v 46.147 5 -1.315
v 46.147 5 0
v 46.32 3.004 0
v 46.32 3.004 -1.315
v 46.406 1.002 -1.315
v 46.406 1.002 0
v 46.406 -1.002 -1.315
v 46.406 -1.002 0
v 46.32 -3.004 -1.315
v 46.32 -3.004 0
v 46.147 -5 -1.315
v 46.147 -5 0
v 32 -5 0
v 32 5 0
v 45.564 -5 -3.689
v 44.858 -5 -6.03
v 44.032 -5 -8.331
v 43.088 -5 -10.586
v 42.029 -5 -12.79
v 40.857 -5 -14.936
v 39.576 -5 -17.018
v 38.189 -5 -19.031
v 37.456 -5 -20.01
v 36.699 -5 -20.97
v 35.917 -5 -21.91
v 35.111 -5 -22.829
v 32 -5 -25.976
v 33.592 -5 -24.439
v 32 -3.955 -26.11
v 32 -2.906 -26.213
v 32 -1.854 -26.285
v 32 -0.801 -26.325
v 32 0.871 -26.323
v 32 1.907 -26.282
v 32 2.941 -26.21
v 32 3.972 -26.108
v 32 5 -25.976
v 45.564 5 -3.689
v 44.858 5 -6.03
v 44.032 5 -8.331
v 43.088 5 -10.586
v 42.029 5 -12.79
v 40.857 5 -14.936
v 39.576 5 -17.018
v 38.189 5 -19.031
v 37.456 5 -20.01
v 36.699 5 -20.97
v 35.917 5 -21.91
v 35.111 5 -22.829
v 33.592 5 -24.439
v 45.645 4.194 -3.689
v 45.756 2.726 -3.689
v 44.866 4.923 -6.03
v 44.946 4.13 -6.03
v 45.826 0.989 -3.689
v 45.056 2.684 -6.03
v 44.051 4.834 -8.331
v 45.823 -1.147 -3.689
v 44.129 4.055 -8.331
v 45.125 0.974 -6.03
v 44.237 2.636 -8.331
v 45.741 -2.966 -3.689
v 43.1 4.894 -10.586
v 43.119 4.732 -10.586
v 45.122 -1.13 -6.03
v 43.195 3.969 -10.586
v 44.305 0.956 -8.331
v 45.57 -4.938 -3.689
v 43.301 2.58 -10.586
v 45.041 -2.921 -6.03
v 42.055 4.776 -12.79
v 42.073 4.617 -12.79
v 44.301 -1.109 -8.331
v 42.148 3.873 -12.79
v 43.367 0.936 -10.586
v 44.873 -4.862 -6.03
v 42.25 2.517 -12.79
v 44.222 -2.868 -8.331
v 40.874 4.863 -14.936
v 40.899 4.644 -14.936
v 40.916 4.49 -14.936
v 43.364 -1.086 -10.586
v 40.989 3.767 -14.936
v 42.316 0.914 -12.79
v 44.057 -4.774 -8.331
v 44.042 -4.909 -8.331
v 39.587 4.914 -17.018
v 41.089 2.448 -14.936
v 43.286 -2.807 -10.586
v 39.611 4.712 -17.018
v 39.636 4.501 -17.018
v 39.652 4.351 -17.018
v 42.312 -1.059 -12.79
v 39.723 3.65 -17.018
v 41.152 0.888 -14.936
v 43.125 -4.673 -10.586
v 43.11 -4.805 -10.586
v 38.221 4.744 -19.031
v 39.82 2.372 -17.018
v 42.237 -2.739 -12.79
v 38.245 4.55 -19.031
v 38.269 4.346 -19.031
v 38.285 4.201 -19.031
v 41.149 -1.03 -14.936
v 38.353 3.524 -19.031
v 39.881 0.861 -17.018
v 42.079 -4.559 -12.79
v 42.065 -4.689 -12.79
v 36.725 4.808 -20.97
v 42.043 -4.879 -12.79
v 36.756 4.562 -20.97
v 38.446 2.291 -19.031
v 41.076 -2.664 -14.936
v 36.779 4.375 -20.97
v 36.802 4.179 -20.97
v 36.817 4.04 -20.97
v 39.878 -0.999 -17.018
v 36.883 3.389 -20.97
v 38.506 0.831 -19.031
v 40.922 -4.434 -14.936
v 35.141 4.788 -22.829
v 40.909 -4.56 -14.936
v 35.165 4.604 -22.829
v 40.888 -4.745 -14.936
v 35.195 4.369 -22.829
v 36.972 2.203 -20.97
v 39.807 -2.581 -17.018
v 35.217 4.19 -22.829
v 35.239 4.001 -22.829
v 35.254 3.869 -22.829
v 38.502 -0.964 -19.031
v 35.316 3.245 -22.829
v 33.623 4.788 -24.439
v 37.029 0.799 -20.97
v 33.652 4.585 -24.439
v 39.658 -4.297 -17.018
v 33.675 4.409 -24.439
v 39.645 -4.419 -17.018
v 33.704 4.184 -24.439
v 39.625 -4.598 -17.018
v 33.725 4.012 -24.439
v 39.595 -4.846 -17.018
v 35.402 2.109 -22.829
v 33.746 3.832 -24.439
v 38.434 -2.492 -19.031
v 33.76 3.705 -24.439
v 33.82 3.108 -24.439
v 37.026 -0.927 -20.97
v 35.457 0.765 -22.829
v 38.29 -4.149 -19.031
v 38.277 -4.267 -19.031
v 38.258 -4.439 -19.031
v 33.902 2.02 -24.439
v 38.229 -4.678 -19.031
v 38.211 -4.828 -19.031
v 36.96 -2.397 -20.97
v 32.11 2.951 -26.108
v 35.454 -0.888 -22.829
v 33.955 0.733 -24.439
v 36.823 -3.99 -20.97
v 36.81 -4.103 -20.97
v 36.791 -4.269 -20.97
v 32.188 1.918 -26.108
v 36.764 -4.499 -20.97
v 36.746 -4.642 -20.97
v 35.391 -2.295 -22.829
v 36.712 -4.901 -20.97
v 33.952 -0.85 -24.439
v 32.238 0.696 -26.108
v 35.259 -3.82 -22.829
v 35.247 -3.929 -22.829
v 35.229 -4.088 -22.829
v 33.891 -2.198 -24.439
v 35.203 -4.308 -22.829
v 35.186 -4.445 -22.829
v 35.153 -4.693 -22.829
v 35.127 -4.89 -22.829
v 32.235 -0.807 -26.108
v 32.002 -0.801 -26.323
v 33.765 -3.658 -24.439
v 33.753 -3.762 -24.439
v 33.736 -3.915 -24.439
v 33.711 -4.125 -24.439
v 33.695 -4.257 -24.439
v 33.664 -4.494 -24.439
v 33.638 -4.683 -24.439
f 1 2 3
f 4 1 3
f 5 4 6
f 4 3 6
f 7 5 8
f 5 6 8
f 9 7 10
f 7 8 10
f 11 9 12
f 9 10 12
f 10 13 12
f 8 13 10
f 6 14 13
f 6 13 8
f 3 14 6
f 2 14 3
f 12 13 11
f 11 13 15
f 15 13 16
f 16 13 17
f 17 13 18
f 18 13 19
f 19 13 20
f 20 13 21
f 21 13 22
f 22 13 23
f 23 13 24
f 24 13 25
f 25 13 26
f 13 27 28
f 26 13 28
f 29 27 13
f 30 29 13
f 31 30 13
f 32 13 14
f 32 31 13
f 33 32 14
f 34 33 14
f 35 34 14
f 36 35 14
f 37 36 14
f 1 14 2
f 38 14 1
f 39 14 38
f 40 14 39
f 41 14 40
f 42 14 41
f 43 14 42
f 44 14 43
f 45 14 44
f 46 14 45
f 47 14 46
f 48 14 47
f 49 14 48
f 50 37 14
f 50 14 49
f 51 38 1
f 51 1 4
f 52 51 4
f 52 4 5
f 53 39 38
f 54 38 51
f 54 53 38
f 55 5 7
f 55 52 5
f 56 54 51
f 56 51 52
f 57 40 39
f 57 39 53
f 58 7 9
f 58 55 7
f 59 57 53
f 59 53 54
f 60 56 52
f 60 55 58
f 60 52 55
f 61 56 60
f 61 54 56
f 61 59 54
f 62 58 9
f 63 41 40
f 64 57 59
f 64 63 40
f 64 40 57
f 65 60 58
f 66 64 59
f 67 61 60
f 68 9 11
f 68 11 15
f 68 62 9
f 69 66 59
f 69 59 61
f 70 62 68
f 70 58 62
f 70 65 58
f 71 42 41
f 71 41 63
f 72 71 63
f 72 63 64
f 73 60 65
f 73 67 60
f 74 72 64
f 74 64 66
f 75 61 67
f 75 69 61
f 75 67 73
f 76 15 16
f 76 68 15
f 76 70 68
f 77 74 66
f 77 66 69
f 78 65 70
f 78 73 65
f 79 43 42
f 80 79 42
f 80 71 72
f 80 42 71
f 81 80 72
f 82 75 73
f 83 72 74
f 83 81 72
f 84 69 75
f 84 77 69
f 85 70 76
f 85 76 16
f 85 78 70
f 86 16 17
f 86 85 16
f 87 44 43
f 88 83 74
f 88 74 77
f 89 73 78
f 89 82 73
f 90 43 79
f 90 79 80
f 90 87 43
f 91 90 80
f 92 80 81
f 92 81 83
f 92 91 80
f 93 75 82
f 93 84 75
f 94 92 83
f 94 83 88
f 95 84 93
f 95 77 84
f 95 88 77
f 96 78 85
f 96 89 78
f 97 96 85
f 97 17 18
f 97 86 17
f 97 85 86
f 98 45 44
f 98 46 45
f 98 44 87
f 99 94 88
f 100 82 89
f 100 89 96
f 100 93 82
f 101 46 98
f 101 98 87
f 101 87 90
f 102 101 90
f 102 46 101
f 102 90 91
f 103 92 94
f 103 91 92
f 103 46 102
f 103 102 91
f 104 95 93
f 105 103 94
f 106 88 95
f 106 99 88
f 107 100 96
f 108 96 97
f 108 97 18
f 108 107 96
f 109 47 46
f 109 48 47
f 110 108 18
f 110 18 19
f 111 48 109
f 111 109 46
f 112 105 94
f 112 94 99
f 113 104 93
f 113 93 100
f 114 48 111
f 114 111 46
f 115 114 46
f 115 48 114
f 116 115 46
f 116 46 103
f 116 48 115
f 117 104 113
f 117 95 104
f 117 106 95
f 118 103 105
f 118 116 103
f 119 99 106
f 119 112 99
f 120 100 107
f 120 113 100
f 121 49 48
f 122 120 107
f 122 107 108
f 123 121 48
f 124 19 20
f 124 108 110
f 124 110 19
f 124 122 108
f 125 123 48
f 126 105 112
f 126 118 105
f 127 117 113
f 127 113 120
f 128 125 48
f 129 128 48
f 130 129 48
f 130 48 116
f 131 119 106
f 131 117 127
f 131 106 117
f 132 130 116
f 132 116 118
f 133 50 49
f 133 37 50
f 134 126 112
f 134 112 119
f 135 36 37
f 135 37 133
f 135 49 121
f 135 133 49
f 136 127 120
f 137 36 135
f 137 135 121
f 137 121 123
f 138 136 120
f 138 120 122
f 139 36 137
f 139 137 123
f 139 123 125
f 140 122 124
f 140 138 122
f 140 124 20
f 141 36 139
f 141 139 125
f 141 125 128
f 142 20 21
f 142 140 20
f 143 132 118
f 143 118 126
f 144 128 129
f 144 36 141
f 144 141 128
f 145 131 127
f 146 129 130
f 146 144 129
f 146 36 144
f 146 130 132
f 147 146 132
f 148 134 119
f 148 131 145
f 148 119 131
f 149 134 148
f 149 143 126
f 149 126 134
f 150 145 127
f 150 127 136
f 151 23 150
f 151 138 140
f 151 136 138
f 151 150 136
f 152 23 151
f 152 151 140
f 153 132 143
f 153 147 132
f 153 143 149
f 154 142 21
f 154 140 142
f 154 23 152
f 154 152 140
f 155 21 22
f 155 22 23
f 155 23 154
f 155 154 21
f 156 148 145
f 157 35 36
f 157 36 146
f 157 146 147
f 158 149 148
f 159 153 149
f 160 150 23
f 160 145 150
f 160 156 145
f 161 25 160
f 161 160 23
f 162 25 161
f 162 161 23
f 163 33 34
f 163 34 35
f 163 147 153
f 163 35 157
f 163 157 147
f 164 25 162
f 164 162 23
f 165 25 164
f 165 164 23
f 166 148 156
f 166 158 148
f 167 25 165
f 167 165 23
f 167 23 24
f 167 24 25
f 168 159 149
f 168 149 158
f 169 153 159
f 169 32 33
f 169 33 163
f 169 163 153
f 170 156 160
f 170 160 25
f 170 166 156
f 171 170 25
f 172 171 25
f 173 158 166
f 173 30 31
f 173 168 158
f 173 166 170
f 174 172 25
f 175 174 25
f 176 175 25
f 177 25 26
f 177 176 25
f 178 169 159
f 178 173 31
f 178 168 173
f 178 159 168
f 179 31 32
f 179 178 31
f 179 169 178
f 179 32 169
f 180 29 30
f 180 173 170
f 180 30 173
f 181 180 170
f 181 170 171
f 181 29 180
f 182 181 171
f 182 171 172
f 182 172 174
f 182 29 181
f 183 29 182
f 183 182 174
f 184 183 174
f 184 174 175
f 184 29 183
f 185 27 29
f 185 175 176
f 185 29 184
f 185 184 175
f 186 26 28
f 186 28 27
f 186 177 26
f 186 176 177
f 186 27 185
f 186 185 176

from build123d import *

# Parameters (mm, degrees)
BOX_W     = 15
BOX_H     = 10
BOX_DEPTH = 30


with BuildPart() as cubo:
    # Box → Box (new body)
    with BuildSketch(Plane(origin=(32, -5, -30), x_dir=(1, 0, 0), z_dir=(0, 0, 1))):
        with Locations((7.5, 5)):
            Rectangle(BOX_W, BOX_H)
    extrude(amount=BOX_DEPTH)


with BuildPart() as soporte:
    # Sketch001 → Revolution001 (revolve)
    with BuildSketch(Plane(origin=(0, 0, 0), x_dir=(1, 0, 0), z_dir=(0, 1, 0))):
        with BuildLine():
            Line((20, 50.804604), (20, 34.3146))
            ThreePointArc((46.417222, 1.3146), (37.081826, 20.915194), (20, 34.3146))
            Line((46.417222, 1.3146), (46.417222, -11.6854))
            Line((46.417222, -11.6854), (0, -11.6854))
            Line((0, 50.804604), (0, -11.6854))
            Line((20, 50.804604), (0, 50.804604))
        make_face()
    revolve(axis=Axis((0, 0, 0), (0, 0, -1)))

    # Common: intersect Cubo
    add(cubo.part, mode=Mode.INTERSECT)


solid = soporte.part
